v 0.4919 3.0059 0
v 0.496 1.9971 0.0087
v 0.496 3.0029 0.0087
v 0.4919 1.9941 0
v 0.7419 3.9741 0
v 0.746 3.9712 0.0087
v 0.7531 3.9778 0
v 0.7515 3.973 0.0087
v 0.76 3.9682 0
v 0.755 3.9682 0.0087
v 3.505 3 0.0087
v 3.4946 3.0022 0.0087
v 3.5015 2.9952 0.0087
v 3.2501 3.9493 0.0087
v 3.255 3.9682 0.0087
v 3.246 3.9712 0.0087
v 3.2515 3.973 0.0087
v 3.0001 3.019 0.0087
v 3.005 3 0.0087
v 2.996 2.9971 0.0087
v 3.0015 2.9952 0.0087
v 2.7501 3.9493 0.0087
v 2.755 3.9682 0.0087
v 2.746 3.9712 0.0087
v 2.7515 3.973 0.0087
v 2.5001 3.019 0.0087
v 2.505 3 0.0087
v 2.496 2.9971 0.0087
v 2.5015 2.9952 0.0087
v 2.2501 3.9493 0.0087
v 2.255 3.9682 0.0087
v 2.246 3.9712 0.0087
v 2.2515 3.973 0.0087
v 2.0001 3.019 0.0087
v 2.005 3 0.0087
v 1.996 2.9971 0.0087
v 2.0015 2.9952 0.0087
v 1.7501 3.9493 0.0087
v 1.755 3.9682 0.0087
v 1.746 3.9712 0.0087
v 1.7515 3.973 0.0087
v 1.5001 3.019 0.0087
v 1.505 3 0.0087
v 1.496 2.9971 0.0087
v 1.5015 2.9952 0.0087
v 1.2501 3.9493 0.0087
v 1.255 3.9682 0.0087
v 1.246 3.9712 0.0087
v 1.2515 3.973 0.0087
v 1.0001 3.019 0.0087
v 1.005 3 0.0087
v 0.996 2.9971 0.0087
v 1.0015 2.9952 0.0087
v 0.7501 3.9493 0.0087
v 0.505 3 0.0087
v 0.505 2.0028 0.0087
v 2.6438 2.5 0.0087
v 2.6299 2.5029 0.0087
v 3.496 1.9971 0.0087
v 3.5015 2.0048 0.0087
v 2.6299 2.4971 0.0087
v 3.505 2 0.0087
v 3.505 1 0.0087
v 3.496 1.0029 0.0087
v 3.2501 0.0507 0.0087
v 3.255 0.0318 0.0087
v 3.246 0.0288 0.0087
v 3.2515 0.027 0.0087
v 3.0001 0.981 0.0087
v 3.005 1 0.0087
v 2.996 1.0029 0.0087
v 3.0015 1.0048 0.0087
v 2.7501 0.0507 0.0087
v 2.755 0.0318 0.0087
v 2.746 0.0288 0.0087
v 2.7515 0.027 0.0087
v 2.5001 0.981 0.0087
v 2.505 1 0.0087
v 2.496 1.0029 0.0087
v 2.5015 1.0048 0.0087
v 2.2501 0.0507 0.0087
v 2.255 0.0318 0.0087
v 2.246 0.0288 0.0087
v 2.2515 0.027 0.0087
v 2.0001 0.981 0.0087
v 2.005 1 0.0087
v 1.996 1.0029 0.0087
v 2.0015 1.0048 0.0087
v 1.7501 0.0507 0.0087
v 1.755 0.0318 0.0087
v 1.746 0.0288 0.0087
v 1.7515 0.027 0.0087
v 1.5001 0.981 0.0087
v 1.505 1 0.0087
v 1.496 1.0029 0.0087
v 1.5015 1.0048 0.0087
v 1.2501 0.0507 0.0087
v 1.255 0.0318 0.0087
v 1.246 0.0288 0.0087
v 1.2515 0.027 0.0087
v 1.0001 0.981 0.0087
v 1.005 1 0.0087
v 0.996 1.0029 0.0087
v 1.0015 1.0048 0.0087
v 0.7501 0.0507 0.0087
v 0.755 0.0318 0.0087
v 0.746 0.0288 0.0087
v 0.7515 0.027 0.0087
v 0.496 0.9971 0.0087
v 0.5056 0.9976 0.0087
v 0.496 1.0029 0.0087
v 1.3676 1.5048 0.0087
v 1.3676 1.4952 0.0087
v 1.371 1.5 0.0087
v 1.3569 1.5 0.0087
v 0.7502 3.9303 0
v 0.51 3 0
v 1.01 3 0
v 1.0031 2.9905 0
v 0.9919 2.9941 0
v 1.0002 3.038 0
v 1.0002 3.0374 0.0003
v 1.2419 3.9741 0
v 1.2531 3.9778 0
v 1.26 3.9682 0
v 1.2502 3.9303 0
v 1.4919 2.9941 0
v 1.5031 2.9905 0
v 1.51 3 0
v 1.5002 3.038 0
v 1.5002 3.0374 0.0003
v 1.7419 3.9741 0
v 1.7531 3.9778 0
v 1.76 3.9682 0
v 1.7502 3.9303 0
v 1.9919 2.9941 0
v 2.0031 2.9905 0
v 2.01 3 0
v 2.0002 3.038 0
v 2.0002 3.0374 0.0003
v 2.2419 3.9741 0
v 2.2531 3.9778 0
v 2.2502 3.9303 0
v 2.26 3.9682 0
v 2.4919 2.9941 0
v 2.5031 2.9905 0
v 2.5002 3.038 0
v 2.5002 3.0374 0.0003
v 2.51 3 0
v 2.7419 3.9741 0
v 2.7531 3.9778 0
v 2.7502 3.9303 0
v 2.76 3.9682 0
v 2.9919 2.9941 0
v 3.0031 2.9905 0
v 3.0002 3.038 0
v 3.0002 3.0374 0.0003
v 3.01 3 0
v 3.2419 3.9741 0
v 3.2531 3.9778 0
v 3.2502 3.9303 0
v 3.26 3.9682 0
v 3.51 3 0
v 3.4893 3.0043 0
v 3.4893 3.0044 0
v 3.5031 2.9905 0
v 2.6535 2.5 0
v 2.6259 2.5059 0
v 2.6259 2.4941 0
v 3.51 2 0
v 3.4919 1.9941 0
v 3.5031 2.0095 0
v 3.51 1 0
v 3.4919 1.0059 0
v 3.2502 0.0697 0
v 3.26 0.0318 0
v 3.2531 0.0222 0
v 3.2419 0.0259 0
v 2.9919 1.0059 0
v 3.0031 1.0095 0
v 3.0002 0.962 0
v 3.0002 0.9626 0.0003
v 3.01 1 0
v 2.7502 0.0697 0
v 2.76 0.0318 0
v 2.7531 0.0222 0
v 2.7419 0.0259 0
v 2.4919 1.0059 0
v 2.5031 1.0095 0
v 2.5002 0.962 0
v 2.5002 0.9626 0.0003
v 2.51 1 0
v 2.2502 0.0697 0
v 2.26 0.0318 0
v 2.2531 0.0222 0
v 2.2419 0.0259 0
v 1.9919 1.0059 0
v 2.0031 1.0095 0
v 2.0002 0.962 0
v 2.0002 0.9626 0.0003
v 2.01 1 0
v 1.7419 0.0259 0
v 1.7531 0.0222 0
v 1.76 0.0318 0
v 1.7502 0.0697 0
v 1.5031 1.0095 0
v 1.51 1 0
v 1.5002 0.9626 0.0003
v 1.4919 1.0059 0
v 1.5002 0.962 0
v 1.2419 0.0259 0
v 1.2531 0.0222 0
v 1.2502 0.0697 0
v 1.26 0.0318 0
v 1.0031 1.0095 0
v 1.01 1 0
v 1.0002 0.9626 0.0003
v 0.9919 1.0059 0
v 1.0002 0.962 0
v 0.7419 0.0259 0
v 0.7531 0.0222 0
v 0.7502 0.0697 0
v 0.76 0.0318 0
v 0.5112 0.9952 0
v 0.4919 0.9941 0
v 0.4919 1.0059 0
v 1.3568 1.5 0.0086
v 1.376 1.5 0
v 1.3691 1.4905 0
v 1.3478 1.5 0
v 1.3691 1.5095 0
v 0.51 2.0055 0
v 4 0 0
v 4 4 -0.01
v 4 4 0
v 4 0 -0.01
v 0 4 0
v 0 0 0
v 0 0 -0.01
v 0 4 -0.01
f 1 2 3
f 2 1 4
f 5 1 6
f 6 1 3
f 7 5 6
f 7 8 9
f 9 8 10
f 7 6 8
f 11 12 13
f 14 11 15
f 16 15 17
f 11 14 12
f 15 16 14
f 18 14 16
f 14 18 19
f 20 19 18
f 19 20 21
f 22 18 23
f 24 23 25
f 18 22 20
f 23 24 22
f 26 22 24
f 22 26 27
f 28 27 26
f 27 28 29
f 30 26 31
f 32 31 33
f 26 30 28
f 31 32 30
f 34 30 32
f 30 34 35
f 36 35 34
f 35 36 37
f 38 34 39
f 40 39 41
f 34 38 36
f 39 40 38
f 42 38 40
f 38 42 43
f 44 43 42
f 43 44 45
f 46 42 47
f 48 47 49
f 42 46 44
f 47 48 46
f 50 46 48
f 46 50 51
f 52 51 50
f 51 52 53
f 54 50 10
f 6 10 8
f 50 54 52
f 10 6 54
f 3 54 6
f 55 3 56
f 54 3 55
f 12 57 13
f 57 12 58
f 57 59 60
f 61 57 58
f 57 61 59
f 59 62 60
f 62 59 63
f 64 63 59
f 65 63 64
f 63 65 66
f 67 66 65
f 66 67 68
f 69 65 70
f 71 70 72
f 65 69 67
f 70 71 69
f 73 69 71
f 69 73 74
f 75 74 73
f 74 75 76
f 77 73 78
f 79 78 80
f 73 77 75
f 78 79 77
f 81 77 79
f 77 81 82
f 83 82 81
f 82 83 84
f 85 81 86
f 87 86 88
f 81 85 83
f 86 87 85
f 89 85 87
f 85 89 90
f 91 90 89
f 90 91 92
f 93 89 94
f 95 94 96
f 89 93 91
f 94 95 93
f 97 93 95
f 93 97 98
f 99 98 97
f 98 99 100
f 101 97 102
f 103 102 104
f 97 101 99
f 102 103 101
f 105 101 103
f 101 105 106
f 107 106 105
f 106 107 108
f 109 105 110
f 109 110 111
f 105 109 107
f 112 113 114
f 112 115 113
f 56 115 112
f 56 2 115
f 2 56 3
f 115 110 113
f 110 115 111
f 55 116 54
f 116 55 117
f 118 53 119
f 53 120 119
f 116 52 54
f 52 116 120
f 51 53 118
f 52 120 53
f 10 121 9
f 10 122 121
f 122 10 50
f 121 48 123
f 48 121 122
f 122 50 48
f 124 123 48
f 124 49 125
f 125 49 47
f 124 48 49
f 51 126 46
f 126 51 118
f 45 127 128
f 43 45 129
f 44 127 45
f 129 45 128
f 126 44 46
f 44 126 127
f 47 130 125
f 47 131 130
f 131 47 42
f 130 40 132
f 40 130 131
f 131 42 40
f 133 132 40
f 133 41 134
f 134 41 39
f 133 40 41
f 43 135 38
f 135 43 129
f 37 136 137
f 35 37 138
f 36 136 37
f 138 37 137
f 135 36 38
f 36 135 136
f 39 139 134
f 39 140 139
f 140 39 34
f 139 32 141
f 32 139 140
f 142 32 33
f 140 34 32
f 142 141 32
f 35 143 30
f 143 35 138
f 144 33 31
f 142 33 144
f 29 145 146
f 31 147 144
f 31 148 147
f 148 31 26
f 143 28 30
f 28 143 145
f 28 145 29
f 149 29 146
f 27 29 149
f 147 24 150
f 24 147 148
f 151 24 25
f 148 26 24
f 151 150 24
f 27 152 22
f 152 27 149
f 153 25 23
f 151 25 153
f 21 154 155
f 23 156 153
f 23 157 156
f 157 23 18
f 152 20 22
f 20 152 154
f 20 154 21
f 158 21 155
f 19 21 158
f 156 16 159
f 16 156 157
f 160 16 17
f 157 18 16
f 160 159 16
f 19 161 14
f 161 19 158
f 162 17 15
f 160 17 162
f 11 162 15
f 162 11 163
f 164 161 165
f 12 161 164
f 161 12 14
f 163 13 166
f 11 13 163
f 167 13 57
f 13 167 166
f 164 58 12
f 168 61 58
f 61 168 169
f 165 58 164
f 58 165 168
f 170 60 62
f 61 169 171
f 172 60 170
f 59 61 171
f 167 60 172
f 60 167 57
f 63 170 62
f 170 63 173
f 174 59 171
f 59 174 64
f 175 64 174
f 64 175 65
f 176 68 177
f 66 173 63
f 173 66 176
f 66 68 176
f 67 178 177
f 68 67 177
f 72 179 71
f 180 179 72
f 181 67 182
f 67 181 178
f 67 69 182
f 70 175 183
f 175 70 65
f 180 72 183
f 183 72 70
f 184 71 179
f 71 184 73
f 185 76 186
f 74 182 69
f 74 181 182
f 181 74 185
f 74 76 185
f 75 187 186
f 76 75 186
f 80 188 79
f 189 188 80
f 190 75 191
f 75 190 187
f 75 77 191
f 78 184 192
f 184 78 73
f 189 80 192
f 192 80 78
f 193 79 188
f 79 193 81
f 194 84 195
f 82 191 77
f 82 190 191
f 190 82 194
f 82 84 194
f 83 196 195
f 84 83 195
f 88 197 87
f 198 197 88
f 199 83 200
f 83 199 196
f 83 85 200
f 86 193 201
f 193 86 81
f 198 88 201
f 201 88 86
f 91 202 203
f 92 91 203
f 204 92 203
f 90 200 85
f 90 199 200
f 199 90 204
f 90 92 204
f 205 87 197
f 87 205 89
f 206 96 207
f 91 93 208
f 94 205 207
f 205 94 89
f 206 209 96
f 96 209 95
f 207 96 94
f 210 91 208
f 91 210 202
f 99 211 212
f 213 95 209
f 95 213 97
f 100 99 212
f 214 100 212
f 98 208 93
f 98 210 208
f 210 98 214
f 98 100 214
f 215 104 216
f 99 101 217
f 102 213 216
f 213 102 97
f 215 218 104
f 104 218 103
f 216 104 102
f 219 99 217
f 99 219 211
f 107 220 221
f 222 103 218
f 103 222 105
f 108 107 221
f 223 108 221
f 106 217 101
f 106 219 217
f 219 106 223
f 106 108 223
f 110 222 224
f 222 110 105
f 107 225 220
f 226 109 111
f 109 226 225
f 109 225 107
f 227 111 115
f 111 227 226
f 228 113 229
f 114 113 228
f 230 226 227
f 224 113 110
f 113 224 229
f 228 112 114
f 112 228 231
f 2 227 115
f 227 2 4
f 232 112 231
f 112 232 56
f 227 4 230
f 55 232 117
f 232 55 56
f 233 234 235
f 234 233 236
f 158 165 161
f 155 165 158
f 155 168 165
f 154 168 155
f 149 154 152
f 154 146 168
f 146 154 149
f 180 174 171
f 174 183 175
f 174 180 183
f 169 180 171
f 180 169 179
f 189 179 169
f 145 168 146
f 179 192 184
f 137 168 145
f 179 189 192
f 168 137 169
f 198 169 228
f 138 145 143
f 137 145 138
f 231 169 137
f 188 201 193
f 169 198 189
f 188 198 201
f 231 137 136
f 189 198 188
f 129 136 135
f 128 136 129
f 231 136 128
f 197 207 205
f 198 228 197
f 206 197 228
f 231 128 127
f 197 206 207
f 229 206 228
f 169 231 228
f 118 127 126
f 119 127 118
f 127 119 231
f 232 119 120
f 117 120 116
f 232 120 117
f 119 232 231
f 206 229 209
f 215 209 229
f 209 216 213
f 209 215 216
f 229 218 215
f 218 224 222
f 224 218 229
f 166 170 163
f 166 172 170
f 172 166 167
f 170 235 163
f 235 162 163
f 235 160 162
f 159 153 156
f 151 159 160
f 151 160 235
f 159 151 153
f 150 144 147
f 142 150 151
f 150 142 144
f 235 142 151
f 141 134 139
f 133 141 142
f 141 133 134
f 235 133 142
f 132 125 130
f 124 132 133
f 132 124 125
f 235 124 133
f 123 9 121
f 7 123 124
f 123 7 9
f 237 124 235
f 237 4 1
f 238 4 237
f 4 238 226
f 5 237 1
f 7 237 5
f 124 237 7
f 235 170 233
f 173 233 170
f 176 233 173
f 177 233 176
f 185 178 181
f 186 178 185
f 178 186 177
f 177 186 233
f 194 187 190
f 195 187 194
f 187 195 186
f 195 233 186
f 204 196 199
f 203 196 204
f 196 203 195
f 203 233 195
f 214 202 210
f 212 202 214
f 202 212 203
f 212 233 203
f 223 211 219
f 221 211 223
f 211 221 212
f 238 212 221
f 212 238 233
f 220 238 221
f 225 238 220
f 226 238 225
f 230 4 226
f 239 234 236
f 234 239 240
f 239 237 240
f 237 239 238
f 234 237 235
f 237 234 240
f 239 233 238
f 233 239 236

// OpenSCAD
hull(){
    translate([0.5, 3.0]) sphere(0.01);
    translate([0.75, 3.968245836551854]) sphere(0.01);
}
hull(){
    translate([0.75, 3.968245836551854]) sphere(0.01);
    translate([1.0, 3.0]) sphere(0.01);
}
hull(){
    translate([1.0, 3.0]) sphere(0.01);
    translate([1.25, 3.968245836551854]) sphere(0.01);
}
hull(){
    translate([1.25, 3.968245836551854]) sphere(0.01);
    translate([1.5, 3.0]) sphere(0.01);
}
hull(){
    translate([1.5, 3.0]) sphere(0.01);
    translate([1.75, 3.968245836551854]) sphere(0.01);
}
hull(){
    translate([1.75, 3.968245836551854]) sphere(0.01);
    translate([2.0, 3.0]) sphere(0.01);
}
hull(){
    translate([2.0, 3.0]) sphere(0.01);
    translate([2.25, 3.968245836551854]) sphere(0.01);
}
hull(){
    translate([2.25, 3.968245836551854]) sphere(0.01);
    translate([2.5, 3.0]) sphere(0.01);
}
hull(){
    translate([2.5, 3.0]) sphere(0.01);
    translate([2.75, 3.968245836551854]) sphere(0.01);
}
hull(){
    translate([2.75, 3.968245836551854]) sphere(0.01);
    translate([3.0, 3.0]) sphere(0.01);
}
hull(){
    translate([3.0, 3.0]) sphere(0.01);
    translate([3.25, 3.968245836551854]) sphere(0.01);
}
hull(){
    translate([3.25, 3.968245836551854]) sphere(0.01);
    translate([3.5, 3.0]) sphere(0.01);
}
hull(){
    translate([3.5, 3.0]) sphere(0.01);
    translate([2.6339745962155616, 2.5]) sphere(0.01);
}
hull(){
    translate([2.6339745962155616, 2.5]) sphere(0.01);
    translate([3.5, 2.0]) sphere(0.01);
}
hull(){
    translate([3.5, 2.0]) sphere(0.01);
    translate([3.5, 1.0]) sphere(0.01);
}
hull(){
    translate([3.5, 1.0]) sphere(0.01);
    translate([3.25, 0.031754163448145745]) sphere(0.01);
}
hull(){
    translate([3.25, 0.031754163448145745]) sphere(0.01);
    translate([3.0, 1.0]) sphere(0.01);
}
hull(){
    translate([3.0, 1.0]) sphere(0.01);
    translate([2.75, 0.031754163448145745]) sphere(0.01);
}
hull(){
    translate([2.75, 0.031754163448145745]) sphere(0.01);
    translate([2.5, 1.0]) sphere(0.01);
}
hull(){
    translate([2.5, 1.0]) sphere(0.01);
    translate([2.25, 0.031754163448145745]) sphere(0.01);
}
hull(){
    translate([2.25, 0.031754163448145745]) sphere(0.01);
    translate([2.0, 1.0]) sphere(0.01);
}
hull(){
    translate([2.0, 1.0]) sphere(0.01);
    translate([1.75, 0.031754163448145745]) sphere(0.01);
}
hull(){
    translate([1.75, 0.031754163448145745]) sphere(0.01);
    translate([1.5, 1.0]) sphere(0.01);
}
hull(){
    translate([1.5, 1.0]) sphere(0.01);
    translate([1.25, 0.031754163448145745]) sphere(0.01);
}
hull(){
    translate([1.25, 0.031754163448145745]) sphere(0.01);
    translate([1.0, 1.0]) sphere(0.01);
}
hull(){
    translate([1.0, 1.0]) sphere(0.01);
    translate([0.75, 0.031754163448145745]) sphere(0.01);
}
hull(){
    translate([0.75, 0.031754163448145745]) sphere(0.01);
    translate([0.5, 1.0]) sphere(0.01);
}
hull(){
    translate([0.5, 1.0]) sphere(0.01);
    translate([1.3660254037844386, 1.5]) sphere(0.01);
}
hull(){
    translate([1.3660254037844386, 1.5]) sphere(0.01);
    translate([0.5, 2.0]) sphere(0.01);
}
hull(){
    translate([0.5, 2.0]) sphere(0.01);
    translate([0.5, 3.0]) sphere(0.01);
}
translate([0,0,-0.01]) color([0.1,0.1,0.1]) cube([4,4,0.01]);
